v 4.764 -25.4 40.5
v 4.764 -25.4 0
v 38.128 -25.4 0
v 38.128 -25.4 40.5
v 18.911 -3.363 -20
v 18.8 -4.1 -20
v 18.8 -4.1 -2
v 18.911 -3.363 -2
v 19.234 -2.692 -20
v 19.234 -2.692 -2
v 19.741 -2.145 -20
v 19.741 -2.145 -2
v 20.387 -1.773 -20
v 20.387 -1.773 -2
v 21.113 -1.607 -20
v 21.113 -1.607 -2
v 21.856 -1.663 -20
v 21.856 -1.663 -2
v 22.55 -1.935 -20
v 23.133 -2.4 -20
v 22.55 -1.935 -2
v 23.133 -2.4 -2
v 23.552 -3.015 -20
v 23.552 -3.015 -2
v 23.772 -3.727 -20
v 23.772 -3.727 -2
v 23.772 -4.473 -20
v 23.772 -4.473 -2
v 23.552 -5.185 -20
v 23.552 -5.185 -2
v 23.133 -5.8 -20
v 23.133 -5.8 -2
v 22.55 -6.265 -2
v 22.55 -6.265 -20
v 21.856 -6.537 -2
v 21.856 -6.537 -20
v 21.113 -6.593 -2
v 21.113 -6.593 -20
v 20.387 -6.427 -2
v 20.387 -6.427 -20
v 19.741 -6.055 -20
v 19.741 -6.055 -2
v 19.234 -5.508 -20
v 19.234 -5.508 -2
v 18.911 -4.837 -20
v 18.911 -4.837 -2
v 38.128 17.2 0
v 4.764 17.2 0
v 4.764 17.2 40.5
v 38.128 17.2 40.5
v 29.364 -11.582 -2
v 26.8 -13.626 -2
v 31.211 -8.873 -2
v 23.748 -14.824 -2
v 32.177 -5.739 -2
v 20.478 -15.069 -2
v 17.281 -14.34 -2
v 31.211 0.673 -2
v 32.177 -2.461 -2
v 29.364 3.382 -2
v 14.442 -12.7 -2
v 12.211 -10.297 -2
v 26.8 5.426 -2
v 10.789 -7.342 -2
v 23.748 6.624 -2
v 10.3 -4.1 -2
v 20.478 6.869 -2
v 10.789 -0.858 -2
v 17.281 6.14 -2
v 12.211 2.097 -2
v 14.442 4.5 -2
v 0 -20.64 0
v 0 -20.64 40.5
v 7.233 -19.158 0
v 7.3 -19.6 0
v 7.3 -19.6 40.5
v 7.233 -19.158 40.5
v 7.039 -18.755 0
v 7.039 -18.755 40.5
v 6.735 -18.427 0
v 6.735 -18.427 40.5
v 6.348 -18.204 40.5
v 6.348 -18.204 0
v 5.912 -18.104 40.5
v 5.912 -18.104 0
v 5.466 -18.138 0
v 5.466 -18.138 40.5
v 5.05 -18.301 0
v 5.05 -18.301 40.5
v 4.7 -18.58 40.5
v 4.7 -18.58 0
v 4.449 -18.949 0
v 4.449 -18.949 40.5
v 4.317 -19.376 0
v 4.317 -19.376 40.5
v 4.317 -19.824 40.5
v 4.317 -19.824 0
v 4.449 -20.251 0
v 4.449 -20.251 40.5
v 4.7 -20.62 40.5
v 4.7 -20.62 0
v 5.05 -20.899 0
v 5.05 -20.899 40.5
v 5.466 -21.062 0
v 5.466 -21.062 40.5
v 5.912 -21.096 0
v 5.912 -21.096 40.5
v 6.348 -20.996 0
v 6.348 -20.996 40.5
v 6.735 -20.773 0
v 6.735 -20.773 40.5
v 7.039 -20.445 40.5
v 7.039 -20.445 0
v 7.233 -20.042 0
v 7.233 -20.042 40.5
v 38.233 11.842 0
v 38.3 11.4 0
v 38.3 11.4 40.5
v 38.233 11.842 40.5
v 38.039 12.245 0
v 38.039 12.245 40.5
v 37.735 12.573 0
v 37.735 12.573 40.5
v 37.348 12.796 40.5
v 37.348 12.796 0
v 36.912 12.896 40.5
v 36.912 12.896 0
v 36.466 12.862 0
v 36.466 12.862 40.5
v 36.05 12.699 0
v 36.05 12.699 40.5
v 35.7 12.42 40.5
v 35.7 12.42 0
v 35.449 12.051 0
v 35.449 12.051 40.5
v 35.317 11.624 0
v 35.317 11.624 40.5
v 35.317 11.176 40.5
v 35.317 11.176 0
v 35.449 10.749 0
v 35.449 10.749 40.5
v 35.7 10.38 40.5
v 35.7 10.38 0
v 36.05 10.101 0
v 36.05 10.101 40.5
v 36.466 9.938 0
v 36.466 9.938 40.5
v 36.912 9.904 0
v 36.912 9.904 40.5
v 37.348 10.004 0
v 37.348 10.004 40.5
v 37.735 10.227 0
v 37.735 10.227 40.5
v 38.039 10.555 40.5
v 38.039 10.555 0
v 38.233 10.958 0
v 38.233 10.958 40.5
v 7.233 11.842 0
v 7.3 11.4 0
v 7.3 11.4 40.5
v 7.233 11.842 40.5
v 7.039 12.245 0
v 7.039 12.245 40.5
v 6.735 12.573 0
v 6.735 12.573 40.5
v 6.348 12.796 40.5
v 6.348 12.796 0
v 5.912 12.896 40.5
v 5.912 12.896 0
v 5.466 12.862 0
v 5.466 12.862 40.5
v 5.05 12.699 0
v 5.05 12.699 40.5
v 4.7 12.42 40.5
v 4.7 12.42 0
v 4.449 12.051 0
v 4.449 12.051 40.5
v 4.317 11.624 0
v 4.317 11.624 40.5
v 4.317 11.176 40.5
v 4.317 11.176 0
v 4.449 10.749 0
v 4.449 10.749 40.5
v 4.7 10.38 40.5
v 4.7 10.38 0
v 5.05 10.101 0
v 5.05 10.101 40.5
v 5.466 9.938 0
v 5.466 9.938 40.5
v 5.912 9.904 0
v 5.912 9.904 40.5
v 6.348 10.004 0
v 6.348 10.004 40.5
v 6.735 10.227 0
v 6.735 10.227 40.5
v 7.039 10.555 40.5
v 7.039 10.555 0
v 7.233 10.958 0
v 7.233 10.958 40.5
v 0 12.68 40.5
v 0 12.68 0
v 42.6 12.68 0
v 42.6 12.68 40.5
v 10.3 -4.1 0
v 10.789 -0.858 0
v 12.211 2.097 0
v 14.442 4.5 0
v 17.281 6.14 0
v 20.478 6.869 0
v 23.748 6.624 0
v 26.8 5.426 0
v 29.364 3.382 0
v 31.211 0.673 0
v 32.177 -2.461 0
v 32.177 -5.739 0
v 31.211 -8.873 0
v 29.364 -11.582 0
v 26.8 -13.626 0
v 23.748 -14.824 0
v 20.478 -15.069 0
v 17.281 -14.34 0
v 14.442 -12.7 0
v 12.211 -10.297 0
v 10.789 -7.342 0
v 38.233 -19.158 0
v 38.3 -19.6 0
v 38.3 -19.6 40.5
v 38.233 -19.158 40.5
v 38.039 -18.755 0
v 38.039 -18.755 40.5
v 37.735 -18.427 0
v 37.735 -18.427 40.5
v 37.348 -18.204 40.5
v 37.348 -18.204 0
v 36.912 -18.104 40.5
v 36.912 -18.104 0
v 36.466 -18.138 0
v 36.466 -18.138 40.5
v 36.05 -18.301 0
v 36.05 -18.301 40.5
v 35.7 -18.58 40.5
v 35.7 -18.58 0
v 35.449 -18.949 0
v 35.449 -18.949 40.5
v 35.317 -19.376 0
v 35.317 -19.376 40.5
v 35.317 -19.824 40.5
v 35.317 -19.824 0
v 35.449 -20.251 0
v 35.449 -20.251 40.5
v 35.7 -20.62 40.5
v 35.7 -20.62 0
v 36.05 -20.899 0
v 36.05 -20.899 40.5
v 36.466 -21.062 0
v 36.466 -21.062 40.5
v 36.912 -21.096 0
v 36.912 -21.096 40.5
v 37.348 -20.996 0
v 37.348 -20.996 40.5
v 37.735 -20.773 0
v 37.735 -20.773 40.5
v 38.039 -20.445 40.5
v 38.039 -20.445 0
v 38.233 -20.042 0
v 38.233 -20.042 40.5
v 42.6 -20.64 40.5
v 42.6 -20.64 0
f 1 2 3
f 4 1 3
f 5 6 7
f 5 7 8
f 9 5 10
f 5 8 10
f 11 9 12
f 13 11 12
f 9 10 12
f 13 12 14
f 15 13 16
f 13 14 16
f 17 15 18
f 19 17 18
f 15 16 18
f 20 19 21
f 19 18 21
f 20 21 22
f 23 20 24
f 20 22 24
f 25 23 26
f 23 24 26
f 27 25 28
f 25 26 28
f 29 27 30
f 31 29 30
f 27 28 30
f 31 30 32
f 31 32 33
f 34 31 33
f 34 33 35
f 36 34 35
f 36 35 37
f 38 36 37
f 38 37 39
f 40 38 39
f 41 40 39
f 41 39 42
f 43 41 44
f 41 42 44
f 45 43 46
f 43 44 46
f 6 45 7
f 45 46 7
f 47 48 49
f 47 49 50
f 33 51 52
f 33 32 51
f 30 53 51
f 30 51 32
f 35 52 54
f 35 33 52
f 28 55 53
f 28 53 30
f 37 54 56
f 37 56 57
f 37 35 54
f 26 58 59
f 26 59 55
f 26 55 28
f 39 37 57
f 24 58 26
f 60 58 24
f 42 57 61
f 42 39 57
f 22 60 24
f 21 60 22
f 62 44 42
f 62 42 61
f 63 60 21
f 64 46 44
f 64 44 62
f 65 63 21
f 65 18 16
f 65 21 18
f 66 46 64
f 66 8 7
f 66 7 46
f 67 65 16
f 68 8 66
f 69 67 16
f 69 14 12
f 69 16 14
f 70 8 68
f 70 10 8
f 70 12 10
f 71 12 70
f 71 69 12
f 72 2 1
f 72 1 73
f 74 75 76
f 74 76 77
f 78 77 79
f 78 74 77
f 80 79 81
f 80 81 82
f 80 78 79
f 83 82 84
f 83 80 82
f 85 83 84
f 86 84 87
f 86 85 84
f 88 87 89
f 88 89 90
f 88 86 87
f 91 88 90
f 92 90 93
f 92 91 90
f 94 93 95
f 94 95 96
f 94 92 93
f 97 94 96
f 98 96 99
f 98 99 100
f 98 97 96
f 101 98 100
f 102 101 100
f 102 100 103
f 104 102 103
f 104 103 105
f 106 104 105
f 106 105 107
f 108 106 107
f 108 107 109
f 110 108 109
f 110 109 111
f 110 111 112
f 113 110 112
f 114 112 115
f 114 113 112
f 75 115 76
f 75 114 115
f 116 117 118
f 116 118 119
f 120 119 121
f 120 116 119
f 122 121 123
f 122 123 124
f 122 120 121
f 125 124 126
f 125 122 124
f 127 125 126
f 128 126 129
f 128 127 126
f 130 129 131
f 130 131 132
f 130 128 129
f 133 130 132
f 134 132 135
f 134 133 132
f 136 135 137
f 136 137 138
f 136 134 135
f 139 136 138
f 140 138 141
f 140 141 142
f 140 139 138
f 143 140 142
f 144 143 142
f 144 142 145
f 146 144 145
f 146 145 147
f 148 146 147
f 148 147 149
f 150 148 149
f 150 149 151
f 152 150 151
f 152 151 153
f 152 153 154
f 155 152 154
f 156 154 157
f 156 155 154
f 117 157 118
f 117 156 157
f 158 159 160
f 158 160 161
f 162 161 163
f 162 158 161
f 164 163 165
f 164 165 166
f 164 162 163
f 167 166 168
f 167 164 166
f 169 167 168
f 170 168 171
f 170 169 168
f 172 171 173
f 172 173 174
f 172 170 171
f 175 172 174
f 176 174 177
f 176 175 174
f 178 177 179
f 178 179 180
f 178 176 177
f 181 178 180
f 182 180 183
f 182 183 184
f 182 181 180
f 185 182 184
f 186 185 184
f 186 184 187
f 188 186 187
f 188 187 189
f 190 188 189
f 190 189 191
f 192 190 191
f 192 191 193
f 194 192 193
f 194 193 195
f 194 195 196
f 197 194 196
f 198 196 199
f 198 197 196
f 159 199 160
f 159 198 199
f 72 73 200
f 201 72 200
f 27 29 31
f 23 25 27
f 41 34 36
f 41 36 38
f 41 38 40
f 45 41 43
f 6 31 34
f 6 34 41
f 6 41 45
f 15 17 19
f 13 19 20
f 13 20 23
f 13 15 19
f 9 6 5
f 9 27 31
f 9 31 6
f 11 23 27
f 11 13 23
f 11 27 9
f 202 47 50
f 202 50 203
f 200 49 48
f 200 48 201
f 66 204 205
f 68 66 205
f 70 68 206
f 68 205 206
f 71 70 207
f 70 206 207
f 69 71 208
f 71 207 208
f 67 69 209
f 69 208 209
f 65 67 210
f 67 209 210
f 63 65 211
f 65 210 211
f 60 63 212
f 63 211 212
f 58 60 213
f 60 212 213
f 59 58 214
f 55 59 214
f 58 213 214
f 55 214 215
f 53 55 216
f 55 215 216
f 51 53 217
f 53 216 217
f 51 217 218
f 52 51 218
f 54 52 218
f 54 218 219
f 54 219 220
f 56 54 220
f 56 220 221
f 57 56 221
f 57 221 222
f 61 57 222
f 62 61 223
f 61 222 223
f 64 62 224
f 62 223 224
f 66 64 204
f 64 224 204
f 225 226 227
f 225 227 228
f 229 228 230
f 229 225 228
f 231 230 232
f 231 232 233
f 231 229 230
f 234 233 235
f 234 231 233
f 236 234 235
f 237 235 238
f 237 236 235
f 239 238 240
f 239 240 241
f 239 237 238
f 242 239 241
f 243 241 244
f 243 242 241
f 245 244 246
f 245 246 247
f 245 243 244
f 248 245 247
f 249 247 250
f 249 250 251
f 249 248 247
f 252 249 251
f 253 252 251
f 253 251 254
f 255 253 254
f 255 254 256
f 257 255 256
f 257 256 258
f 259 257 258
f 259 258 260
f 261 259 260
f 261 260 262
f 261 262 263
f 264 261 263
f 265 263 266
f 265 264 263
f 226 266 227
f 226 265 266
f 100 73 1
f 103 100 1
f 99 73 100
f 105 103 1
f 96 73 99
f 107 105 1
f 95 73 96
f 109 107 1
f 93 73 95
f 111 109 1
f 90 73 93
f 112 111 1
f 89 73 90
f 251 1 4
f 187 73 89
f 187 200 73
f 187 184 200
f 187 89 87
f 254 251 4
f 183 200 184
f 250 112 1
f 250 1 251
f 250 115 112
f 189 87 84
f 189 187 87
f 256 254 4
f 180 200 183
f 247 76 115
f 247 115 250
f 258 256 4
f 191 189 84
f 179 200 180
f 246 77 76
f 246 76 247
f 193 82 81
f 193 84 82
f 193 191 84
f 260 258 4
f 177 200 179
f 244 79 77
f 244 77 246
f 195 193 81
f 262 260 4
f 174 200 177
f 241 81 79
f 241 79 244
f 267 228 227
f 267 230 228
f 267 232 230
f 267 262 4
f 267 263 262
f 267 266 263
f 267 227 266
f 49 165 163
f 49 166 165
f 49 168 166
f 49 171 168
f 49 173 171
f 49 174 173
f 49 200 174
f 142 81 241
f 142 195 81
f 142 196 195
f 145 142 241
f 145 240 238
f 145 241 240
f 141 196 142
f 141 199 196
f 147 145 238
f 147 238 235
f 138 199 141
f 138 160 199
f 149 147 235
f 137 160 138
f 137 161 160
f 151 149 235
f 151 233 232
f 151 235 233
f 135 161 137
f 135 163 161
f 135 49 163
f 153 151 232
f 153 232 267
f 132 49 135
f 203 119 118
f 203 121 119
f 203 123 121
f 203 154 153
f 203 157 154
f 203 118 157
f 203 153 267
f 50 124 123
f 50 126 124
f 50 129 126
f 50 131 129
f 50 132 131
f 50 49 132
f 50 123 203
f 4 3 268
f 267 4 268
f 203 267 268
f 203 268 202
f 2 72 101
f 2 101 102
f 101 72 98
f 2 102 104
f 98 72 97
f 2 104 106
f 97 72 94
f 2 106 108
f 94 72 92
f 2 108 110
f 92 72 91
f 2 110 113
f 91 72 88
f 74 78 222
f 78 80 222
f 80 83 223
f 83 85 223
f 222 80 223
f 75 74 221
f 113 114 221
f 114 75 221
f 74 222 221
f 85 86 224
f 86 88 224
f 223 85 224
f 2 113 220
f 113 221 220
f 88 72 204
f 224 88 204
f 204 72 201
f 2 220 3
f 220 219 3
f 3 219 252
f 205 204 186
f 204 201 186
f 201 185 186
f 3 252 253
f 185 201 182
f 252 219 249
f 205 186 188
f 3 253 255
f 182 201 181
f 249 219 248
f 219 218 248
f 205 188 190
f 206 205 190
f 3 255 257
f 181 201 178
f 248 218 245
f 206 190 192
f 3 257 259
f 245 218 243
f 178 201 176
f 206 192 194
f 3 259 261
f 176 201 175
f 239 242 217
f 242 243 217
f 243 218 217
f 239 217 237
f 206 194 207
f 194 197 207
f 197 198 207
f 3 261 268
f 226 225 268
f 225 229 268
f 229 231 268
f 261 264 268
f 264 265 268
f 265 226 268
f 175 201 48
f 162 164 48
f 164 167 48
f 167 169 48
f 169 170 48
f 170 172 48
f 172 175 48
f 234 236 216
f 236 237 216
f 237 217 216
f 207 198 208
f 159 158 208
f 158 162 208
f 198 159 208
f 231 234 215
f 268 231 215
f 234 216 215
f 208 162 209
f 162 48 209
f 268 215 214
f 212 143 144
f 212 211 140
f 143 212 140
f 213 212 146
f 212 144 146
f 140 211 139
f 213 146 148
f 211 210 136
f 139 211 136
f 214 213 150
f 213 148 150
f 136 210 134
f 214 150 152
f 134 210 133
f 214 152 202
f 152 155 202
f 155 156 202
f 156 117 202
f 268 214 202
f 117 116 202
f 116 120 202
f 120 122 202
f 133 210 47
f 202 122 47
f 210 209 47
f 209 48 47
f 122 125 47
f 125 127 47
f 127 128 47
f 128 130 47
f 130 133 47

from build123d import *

# Parameters (mm, degrees)
SKETCH1_W      = 42.6
SKETCH1_H      = 42.6
SKETCH1_R      = 1.5
EXTRUDE1_DEPTH = 40.5
EXTRUDE2_DEPTH = 40.5
SKETCH5_R      = 11
EXTRUDE3_DEPTH = 2
SKETCH6_R      = 2.5
EXTRUDE4_DEPTH = 18


with BuildPart() as part:
    # Sketch1 → Extrude1 (new body)
    with BuildSketch(Plane.XY):
        with Locations((21.3, -4.1)):
            Rectangle(SKETCH1_W, SKETCH1_H)
        with Locations((5.8, 11.4)):
            Circle(SKETCH1_R, mode=Mode.SUBTRACT)
        with Locations((5.8, -19.6)):
            Circle(SKETCH1_R, mode=Mode.SUBTRACT)
        with Locations((36.8, -19.6)):
            Circle(SKETCH1_R, mode=Mode.SUBTRACT)
        with Locations((36.8, 11.4)):
            Circle(SKETCH1_R, mode=Mode.SUBTRACT)
    extrude(amount=EXTRUDE1_DEPTH)

    # Sketch2 → Extrude2 (cut)
    with BuildSketch(Plane(origin=(0, 0, 0), x_dir=(-1, 0, 0), z_dir=(0, 0, -1))):
        Polygon((-4.764447963, -25.4), (0, -20.64), (0, -25.4), align=None)
        Polygon((-4.764447963, 17.2), (0, 12.680245569), (0, 17.2), align=None)
        Polygon((-38.128194488, 17.2), (-42.6, 12.680245569), (-42.6, 17.2), align=None)
        Polygon((-38.128194488, -25.4), (-42.6, -20.64), (-42.6, -25.4), align=None)
    extrude(amount=-EXTRUDE2_DEPTH, mode=Mode.SUBTRACT)

    # Sketch5 → Extrude3 (add)
    with BuildSketch(Plane(origin=(0, 0, 0), x_dir=(-1, 0, 0), z_dir=(0, 0, -1))):
        with Locations((-21.3, -4.1)):
            Circle(SKETCH5_R)
    extrude(amount=EXTRUDE3_DEPTH)

    # Sketch6 → Extrude4 (add)
    with BuildSketch(Plane(origin=(0, 0, -2), x_dir=(-1, 0, 0), z_dir=(0, 0, -1))):
        with Locations((-21.3, -4.1)):
            Circle(SKETCH6_R)
    extrude(amount=EXTRUDE4_DEPTH)


solid = part.part
